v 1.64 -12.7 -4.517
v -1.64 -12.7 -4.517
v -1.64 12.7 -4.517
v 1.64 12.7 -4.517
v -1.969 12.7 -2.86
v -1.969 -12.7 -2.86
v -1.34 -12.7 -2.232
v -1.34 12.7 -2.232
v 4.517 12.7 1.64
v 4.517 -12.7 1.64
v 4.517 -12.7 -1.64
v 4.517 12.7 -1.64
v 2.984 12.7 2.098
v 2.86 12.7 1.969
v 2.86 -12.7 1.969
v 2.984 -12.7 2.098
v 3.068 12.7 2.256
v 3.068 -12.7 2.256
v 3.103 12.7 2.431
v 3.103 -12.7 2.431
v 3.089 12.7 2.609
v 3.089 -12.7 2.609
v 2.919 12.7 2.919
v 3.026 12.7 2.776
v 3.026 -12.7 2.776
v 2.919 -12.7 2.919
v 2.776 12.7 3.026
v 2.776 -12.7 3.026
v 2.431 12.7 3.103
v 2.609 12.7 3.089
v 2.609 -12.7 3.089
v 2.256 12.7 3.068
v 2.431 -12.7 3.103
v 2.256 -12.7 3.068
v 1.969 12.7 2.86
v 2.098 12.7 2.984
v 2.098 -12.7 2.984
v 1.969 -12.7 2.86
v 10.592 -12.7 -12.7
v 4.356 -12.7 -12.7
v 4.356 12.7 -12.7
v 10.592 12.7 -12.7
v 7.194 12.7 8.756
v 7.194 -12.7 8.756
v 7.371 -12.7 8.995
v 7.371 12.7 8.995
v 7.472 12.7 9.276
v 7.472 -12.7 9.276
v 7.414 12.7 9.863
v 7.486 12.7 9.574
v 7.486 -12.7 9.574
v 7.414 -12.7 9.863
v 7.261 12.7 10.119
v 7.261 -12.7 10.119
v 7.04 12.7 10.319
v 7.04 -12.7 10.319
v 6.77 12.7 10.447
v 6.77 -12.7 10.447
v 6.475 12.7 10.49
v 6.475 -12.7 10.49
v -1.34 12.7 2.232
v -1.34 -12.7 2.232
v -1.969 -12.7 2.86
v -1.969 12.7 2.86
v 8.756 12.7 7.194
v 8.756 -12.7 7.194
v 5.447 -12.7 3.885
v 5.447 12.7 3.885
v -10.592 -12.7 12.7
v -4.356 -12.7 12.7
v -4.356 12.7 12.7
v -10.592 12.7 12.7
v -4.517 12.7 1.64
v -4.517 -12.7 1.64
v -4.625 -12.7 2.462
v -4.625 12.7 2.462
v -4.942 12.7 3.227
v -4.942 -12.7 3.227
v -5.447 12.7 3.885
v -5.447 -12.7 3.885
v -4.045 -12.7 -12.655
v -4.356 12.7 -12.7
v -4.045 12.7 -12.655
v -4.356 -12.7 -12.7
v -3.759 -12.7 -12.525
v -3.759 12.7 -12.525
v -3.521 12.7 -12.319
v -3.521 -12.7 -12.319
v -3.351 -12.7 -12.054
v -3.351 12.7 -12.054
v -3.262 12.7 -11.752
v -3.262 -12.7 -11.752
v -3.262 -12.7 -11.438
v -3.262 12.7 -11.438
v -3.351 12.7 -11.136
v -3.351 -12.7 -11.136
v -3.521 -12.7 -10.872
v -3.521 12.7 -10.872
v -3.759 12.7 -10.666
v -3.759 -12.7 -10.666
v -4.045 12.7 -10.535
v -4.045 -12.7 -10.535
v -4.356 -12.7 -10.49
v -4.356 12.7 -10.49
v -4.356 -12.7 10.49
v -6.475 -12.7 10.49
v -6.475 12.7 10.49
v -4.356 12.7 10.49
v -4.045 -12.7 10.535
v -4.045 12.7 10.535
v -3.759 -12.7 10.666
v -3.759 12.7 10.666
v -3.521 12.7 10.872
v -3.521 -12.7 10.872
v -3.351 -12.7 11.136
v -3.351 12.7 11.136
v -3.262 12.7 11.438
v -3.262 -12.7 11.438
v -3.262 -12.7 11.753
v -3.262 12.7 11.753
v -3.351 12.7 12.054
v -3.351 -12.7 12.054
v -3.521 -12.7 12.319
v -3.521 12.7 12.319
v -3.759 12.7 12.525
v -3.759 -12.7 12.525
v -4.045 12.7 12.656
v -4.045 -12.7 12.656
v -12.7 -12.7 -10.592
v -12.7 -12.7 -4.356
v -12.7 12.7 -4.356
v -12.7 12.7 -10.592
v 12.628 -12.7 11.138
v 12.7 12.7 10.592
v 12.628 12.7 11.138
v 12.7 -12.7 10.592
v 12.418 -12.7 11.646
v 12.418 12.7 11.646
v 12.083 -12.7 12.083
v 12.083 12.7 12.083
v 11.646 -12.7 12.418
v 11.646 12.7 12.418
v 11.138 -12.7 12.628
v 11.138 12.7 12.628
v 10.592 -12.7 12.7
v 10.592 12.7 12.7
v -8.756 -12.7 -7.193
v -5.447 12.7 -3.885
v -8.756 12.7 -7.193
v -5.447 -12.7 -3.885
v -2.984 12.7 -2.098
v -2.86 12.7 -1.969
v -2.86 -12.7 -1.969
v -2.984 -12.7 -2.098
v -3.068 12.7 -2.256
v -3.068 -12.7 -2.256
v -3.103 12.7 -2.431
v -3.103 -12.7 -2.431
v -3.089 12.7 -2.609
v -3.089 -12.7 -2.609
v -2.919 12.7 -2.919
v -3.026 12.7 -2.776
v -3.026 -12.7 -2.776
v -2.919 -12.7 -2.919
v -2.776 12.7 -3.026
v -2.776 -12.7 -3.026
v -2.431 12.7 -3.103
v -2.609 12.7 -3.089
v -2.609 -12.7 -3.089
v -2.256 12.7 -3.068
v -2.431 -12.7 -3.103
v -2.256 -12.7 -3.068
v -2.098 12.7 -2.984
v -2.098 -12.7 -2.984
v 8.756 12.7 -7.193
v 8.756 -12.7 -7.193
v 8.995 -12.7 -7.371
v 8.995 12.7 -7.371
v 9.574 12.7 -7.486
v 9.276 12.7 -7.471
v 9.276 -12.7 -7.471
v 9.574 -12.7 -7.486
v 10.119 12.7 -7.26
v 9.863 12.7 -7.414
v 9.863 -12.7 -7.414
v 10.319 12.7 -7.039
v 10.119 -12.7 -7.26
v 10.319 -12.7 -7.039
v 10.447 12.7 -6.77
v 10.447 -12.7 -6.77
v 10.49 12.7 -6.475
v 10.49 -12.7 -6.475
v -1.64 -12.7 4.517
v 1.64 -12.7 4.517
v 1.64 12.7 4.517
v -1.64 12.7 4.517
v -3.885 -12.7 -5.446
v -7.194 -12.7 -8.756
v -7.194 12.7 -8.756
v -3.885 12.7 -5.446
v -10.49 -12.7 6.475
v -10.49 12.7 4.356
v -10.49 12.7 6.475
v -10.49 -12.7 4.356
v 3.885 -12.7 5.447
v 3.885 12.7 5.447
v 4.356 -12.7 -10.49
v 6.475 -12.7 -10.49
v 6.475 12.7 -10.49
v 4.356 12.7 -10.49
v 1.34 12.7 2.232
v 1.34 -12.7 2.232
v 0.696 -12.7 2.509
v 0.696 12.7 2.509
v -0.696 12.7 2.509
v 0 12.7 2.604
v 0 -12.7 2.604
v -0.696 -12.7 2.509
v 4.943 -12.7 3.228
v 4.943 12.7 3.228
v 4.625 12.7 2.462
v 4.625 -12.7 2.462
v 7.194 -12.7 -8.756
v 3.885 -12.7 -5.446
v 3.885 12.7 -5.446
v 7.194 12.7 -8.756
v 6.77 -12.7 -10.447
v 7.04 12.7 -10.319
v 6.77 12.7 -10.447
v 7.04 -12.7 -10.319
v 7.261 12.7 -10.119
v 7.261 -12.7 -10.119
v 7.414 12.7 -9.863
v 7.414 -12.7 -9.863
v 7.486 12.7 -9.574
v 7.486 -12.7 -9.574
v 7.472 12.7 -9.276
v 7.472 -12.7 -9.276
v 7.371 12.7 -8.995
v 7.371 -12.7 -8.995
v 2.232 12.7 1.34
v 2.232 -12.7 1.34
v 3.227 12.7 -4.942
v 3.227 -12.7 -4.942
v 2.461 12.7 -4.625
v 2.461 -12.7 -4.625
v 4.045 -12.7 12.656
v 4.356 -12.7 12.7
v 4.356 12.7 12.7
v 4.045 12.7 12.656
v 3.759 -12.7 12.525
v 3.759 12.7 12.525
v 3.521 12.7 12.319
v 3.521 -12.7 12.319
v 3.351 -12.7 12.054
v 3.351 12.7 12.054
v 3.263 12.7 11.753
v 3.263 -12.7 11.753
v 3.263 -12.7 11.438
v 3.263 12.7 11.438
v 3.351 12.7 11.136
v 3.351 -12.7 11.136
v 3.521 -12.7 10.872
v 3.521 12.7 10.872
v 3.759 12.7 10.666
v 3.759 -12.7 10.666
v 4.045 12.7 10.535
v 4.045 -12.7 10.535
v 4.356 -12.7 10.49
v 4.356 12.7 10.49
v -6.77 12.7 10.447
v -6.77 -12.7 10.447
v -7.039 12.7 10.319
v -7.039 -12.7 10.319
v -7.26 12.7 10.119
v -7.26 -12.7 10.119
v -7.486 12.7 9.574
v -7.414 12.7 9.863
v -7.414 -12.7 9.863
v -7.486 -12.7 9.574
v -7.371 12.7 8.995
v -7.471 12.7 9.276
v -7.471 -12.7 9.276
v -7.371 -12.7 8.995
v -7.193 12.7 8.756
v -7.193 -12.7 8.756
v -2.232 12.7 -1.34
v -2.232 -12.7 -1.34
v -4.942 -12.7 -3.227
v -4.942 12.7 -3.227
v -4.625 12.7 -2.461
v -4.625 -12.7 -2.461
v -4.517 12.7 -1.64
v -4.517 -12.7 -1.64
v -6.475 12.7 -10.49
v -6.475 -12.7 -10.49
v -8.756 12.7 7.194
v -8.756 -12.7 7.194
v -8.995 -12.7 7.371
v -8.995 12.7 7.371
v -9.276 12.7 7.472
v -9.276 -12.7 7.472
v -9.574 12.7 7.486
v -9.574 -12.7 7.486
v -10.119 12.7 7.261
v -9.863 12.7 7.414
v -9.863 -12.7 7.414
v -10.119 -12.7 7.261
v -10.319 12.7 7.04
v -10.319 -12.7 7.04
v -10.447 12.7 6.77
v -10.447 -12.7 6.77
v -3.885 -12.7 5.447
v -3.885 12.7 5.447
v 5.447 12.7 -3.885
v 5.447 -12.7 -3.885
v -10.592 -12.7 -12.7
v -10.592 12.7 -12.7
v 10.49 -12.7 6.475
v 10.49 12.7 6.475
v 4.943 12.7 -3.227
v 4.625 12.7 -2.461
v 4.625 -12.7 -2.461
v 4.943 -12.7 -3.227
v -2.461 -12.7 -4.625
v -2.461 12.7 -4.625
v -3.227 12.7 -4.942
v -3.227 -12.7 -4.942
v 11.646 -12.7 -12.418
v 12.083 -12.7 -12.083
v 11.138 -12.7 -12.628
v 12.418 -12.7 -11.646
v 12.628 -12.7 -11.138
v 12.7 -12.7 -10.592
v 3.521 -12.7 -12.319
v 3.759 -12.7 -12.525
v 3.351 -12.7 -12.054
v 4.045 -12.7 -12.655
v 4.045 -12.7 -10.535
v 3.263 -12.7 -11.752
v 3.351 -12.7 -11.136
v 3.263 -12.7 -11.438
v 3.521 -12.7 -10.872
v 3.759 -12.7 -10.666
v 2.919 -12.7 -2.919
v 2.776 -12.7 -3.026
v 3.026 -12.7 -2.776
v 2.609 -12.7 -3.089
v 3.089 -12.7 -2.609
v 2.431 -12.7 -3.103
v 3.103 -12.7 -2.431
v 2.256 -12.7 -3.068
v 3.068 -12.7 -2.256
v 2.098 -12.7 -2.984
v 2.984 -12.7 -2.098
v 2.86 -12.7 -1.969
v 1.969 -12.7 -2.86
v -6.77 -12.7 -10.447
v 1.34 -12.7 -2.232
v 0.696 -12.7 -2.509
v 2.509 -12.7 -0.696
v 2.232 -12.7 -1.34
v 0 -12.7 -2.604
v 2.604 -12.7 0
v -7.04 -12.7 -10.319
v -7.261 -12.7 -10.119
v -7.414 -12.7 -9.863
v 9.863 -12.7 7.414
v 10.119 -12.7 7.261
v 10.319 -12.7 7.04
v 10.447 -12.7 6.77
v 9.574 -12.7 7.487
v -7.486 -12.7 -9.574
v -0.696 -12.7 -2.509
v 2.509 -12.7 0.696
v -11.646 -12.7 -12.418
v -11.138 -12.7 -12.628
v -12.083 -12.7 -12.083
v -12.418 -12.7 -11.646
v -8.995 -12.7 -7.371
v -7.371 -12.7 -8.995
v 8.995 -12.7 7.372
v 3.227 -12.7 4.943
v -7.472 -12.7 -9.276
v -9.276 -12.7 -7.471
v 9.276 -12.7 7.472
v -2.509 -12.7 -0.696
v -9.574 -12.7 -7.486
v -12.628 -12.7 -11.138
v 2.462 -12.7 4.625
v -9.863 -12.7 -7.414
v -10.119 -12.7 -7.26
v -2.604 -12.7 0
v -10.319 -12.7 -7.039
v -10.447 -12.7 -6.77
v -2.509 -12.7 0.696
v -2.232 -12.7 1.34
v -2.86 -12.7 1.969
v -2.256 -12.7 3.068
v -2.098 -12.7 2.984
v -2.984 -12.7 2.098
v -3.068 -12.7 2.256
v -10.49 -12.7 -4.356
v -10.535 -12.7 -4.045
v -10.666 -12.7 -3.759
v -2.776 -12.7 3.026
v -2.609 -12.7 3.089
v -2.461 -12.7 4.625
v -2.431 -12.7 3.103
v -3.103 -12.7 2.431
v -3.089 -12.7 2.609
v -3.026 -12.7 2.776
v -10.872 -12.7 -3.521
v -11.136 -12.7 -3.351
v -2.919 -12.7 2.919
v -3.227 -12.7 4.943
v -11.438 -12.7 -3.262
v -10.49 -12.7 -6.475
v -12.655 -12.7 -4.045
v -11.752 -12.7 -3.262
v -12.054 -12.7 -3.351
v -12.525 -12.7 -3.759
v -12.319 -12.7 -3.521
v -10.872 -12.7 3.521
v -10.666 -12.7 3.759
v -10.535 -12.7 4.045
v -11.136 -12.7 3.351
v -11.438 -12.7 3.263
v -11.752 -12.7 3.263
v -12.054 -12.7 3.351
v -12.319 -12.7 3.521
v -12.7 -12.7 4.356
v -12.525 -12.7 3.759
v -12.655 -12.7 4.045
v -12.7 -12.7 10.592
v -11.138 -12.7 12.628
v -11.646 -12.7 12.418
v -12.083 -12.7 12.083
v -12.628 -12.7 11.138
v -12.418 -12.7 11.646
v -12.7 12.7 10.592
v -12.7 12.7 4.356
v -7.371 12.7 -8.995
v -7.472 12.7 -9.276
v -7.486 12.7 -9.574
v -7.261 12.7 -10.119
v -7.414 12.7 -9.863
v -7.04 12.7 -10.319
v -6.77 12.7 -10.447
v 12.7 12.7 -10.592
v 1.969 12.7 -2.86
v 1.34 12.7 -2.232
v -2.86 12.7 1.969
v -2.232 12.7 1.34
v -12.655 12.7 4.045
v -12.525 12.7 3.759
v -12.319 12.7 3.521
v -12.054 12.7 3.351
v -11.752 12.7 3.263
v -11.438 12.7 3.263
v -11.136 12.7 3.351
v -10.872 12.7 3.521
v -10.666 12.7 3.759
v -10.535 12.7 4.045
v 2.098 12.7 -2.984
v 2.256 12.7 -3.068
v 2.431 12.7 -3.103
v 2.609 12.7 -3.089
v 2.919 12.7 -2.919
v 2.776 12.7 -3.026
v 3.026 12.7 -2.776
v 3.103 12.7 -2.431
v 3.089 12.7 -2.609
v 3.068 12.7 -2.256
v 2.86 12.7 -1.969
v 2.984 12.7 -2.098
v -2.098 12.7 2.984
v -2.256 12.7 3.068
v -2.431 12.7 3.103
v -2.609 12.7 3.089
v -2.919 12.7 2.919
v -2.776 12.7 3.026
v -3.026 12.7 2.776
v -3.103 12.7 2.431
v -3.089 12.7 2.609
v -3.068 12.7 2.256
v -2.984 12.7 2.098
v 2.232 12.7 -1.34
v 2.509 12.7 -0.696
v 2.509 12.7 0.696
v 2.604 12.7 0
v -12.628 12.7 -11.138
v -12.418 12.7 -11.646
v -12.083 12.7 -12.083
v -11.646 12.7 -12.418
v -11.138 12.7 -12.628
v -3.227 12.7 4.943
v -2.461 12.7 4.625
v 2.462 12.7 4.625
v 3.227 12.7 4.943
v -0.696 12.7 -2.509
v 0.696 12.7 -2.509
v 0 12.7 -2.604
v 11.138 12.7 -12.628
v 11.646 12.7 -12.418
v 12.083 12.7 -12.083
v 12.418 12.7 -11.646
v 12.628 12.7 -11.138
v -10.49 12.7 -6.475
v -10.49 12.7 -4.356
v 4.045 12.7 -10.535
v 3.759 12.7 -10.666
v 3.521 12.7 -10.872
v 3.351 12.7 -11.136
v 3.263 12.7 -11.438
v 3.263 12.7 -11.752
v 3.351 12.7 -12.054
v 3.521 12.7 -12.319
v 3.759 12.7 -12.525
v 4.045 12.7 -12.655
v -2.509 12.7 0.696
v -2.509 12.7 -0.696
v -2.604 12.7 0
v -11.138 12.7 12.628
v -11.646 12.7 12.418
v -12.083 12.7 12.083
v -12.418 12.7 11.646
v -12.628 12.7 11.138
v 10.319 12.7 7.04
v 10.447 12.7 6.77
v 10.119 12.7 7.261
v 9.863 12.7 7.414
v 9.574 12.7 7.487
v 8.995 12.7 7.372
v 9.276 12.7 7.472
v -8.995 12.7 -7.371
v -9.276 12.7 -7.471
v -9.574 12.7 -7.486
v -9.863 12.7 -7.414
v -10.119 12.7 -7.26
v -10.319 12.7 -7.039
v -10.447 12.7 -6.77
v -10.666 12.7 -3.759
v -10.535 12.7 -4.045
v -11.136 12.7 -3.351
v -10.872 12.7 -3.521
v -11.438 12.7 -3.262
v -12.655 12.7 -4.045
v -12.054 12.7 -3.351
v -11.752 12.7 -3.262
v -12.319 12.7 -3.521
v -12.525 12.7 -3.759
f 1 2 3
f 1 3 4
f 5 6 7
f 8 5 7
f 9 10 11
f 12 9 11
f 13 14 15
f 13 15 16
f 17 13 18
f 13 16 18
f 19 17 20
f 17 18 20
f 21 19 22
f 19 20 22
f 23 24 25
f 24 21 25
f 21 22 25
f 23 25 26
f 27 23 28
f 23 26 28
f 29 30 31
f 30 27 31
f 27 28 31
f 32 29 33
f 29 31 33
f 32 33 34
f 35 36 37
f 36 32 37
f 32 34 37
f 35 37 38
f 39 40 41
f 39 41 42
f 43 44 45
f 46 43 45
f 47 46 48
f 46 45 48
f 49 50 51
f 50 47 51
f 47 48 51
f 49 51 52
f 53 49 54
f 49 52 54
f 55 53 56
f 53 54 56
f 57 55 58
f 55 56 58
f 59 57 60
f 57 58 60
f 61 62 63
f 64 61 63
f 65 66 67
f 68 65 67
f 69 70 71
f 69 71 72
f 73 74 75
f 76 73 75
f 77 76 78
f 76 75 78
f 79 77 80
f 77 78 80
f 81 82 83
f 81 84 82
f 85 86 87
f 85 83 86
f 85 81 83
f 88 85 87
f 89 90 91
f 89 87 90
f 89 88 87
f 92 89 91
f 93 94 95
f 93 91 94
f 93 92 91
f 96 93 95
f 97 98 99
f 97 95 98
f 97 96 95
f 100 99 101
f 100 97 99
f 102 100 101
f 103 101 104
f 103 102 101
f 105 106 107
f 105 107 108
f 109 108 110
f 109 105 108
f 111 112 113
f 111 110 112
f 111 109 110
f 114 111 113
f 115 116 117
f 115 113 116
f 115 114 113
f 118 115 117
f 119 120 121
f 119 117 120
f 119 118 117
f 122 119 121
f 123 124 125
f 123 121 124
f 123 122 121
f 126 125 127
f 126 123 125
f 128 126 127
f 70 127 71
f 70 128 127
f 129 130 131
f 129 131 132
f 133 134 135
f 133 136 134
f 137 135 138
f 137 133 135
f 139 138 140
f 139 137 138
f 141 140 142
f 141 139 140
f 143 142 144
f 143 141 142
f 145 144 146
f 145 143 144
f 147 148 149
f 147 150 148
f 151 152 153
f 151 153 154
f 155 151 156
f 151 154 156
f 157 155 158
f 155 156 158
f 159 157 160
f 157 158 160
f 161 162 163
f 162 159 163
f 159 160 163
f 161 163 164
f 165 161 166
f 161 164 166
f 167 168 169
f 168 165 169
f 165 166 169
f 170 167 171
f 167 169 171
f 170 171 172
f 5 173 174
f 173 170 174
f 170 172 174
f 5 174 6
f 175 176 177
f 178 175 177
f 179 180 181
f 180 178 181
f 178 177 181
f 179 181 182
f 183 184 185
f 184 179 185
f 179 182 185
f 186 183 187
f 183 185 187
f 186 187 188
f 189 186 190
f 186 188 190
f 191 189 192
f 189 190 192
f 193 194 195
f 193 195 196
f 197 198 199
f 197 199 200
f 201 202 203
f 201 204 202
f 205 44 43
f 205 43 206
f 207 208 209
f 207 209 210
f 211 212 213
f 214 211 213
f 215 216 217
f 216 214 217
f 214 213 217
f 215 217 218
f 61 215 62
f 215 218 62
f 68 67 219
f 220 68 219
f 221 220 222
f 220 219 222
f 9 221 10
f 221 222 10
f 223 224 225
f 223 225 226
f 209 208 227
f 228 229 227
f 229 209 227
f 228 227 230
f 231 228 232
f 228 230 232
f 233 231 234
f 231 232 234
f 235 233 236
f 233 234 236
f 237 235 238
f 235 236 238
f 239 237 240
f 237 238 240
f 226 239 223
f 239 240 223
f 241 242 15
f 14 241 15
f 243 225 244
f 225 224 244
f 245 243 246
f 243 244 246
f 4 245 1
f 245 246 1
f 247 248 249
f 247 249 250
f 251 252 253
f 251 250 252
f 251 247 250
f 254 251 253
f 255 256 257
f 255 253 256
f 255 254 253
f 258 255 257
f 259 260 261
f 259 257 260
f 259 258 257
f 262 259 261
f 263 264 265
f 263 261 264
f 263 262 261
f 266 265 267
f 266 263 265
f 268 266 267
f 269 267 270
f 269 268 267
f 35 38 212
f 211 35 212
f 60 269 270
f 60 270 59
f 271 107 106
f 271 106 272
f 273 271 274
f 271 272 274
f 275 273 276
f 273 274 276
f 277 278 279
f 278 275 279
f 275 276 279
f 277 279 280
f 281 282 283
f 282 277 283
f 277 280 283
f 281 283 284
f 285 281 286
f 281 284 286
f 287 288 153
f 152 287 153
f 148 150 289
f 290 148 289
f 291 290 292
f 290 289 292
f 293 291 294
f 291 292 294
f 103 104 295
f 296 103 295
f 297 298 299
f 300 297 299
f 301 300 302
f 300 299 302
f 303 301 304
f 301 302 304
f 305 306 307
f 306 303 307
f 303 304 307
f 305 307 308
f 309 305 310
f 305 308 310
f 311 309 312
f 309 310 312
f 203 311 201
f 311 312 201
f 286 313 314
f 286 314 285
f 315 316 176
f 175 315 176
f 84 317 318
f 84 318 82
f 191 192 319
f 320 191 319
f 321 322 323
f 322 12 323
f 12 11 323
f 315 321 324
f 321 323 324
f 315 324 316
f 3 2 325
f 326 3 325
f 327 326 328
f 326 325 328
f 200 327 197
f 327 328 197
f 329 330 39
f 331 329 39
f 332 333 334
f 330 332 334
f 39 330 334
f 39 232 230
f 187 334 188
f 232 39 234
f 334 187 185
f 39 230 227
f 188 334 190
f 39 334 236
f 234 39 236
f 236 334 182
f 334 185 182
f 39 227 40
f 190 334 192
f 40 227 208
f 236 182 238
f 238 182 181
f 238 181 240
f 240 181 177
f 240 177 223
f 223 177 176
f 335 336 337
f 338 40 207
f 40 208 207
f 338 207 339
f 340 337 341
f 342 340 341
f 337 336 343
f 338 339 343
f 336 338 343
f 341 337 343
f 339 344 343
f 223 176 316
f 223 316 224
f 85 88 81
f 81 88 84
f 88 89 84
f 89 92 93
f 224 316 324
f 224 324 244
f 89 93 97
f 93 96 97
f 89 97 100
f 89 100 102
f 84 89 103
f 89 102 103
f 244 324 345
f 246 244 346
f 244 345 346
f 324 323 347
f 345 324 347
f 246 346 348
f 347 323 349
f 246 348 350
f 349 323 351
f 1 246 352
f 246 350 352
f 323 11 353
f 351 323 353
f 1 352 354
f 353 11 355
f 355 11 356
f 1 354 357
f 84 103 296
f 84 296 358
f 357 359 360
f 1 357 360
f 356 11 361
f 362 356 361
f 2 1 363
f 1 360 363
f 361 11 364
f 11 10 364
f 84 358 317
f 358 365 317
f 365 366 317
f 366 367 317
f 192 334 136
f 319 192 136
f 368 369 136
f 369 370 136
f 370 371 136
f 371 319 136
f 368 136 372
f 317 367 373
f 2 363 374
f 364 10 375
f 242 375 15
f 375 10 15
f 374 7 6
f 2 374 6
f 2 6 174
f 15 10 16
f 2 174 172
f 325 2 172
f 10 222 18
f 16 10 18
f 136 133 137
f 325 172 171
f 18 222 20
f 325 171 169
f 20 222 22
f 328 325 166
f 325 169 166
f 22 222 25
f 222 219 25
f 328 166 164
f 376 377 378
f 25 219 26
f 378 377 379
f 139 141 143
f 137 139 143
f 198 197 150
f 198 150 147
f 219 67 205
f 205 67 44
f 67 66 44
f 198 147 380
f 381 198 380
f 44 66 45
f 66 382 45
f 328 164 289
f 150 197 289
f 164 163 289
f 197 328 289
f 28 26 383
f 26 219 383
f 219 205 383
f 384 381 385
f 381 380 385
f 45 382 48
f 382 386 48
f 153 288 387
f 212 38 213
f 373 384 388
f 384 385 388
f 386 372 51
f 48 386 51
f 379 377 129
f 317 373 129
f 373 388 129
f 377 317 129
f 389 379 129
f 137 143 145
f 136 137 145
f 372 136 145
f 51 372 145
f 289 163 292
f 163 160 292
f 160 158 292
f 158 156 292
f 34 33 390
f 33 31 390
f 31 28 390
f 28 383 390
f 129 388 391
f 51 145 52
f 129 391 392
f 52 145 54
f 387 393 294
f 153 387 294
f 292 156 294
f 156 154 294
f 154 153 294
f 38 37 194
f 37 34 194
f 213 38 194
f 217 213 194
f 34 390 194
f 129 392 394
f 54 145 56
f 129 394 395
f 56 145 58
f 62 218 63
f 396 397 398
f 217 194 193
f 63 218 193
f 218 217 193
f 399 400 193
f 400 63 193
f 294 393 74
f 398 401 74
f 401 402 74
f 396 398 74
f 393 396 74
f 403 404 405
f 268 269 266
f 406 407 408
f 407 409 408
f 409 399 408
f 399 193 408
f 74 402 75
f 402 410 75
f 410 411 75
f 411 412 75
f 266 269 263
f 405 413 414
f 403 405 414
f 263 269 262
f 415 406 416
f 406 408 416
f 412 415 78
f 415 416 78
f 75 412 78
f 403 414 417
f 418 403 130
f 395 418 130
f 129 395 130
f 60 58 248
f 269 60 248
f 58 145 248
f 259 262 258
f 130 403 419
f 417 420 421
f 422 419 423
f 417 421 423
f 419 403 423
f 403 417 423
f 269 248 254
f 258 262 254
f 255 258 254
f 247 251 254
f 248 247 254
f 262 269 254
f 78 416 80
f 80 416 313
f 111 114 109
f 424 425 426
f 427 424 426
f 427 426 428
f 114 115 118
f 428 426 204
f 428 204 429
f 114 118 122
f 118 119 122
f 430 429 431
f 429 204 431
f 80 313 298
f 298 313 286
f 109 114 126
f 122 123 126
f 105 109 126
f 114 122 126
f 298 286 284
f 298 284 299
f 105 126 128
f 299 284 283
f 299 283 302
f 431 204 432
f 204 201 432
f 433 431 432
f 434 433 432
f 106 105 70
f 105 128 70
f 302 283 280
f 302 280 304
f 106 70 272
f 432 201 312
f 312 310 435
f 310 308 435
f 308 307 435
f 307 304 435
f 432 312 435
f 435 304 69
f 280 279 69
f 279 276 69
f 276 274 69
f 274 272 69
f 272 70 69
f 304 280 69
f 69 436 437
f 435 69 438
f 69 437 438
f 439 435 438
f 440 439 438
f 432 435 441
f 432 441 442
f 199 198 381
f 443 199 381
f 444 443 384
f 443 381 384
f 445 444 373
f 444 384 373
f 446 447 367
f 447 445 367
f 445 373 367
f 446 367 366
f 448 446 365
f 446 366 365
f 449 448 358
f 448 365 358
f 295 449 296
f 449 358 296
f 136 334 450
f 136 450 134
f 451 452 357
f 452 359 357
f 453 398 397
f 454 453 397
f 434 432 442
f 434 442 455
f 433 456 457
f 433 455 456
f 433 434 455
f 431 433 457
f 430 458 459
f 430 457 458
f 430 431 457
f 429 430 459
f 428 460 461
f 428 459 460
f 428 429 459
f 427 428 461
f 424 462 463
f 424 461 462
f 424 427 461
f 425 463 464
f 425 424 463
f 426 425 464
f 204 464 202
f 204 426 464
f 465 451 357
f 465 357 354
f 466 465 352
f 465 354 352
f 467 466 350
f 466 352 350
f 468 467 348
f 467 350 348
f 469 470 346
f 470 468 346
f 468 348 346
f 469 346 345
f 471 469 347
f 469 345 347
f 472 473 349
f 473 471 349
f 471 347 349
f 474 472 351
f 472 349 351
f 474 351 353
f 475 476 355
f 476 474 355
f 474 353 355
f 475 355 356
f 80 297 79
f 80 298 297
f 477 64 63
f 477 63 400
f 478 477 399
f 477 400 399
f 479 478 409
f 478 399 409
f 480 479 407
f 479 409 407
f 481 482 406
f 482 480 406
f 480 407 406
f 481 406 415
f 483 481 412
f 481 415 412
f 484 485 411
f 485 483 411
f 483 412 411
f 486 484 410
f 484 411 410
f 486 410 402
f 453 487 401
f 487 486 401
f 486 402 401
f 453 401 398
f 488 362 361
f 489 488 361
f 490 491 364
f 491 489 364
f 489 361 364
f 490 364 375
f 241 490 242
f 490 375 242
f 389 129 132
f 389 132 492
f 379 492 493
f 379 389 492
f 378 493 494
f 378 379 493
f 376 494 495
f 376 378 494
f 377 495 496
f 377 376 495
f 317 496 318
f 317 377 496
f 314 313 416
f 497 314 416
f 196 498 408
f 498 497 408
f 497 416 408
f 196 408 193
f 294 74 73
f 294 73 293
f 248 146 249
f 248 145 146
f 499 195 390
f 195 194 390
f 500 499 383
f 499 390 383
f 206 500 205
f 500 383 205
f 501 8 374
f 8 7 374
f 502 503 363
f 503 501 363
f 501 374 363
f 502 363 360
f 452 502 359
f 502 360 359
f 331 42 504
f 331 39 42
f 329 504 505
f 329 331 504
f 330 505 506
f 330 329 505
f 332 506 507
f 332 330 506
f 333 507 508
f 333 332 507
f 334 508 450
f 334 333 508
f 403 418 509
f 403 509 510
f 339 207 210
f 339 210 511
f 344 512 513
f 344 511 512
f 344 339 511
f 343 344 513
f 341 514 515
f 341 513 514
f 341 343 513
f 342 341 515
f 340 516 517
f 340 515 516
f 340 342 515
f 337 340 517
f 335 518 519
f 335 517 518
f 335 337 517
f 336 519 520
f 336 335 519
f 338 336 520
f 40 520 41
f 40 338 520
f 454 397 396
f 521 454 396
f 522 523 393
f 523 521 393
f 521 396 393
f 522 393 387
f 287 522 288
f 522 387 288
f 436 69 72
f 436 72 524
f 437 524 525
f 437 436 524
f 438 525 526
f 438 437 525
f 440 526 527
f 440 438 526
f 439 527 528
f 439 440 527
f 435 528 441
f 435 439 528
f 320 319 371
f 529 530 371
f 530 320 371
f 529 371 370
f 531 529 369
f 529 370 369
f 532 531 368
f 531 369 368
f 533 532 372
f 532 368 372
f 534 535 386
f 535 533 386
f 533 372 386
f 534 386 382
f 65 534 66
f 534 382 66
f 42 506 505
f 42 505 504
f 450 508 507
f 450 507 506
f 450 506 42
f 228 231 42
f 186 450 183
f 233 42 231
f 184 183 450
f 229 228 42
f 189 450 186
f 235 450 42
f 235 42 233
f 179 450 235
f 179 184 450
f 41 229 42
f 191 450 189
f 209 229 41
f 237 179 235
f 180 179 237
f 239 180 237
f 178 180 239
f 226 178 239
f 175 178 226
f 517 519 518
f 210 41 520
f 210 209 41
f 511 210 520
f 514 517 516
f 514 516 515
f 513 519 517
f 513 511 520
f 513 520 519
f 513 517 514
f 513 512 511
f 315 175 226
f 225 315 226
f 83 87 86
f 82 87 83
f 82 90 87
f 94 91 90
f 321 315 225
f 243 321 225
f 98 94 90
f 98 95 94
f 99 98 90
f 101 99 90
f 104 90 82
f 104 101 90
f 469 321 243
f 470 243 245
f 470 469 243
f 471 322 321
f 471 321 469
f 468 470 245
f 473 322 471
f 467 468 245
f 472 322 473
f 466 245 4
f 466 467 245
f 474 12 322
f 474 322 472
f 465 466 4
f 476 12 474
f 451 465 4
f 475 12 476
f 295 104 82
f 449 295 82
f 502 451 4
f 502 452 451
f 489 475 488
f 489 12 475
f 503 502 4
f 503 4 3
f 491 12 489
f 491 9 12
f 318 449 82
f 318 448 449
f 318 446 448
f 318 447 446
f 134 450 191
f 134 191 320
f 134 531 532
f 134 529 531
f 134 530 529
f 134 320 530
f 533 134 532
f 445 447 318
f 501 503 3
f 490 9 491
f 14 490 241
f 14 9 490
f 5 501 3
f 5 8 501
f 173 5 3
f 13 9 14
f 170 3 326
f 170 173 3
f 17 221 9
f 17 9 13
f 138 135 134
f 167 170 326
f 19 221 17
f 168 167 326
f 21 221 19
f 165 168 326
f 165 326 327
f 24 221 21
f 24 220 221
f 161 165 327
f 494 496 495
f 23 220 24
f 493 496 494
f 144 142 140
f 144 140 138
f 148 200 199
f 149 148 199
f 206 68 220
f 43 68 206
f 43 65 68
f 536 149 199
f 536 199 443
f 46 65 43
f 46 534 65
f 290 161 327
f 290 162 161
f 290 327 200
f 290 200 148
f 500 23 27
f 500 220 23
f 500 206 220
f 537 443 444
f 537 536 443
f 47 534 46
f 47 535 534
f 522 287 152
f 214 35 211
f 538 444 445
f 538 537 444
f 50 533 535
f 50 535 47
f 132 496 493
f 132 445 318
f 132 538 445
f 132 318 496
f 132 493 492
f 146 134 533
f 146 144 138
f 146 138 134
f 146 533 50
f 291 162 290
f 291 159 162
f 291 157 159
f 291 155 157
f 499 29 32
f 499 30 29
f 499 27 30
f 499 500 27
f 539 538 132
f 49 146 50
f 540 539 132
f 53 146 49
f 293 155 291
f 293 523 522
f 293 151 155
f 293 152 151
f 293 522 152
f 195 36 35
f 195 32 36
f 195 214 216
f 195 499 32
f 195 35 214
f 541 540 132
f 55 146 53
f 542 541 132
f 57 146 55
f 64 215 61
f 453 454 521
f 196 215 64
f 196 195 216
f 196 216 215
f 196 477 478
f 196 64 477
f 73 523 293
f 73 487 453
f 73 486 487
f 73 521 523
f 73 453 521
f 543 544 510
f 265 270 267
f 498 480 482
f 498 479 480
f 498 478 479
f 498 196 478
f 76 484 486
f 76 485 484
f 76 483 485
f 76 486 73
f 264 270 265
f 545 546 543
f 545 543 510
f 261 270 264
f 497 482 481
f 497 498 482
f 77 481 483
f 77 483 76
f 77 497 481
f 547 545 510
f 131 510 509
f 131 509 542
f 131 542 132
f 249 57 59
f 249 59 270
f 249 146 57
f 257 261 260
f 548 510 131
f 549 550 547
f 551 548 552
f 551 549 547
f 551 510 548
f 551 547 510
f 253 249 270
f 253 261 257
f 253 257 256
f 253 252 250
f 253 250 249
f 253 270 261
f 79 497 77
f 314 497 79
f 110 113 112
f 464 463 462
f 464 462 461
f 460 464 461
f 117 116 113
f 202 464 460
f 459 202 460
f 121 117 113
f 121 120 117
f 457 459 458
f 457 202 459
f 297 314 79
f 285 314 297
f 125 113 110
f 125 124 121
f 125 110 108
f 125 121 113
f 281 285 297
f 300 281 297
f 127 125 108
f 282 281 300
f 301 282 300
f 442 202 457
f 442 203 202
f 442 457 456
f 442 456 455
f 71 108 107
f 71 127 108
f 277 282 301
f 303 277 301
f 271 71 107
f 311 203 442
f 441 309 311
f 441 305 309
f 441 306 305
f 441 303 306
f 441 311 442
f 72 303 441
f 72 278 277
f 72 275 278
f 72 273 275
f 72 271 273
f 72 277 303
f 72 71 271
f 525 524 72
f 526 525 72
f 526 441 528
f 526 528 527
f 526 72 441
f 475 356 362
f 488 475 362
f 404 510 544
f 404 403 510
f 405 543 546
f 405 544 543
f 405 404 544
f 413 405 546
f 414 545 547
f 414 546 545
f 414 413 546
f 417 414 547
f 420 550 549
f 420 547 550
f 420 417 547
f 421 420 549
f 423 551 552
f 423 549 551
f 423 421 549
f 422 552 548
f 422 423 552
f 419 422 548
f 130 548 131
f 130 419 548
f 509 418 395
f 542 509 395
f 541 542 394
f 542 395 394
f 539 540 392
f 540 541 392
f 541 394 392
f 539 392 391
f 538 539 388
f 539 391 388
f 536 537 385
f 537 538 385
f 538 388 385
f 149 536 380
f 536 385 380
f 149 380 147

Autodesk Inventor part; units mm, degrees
ref_plane "YZ Plane" through (0, 0, 0) normal (1, 0, 0) x (0, 1, 0)
ref_plane "XZ Plane" through (0, 0, 0) normal (0, 1, 0) x (-1, 0, 0)
ref_plane "XY Plane" through (0, 0, 0) normal (0, 0, 1) x (1, 0, 0)
sketch "Sketch1" plane through (0, 0, 0) normal (0, 1, 0) x (-1, 0, 0)
  arc A0 (2.8605, 1.9692) -> (1.9692, 2.8605) centre (2.4696, 2.4696) ccw
  line L0 (1.3405, 2.2319) -> (1.9692, 2.8605)
  arc A1 (1.3405, 2.2319) -> (-1.3405, 2.2319) centre (0, 0) ccw
  line L1 (-1.9692, 2.8605) -> (-1.3405, 2.2319)
  arc A2 (-1.9692, 2.8605) -> (-2.8605, 1.9692) centre (-2.4696, 2.4696) ccw
  line L2 (-2.2319, 1.3405) -> (-2.8605, 1.9692)
  arc A3 (-2.2319, 1.3405) -> (-2.2319, -1.3405) centre (0, 0) ccw
  line L3 (-2.8605, -1.9692) -> (-2.2319, -1.3405)
  arc A4 (-2.8605, -1.9692) -> (-1.9692, -2.8605) centre (-2.4696, -2.4696) ccw
  line L4 (-1.3405, -2.2319) -> (-1.9692, -2.8605)
  arc A5 (-1.3405, -2.2319) -> (1.3405, -2.2319) centre (0, 0) ccw
  line L5 (1.9692, -2.8605) -> (1.3405, -2.2319)
  arc A6 (1.9692, -2.8605) -> (2.8605, -1.9692) centre (2.4696, -2.4696) ccw
  line L6 (2.2319, -1.3405) -> (2.8605, -1.9692)
  arc A7 (2.2319, -1.3405) -> (2.2319, 1.3405) centre (0, 0) ccw
  line L7 (2.8605, 1.9692) -> (2.2319, 1.3405)
  arc A8 (-4.5172, 1.6401) -> (-5.4471, 3.8852) centre (-7.6922, 1.6401) ccw
  line L8 (-8.7558, 7.1939) -> (-5.4471, 3.8852)
  arc A9 (-8.7558, 7.1939) -> (-10.4905, 6.4753) centre (-9.4743, 6.4753) ccw
  line L9 (-10.4905, -6.4748) -> (-10.4905, 6.4753)
  arc A10 (-10.4905, -6.4748) -> (-8.7558, -7.1933) centre (-9.4743, -6.4748) ccw
  line L10 (-5.4471, -3.8846) -> (-8.7558, -7.1933)
  arc A11 (-5.4471, -3.8846) -> (-4.5172, -1.6396) centre (-7.6922, -1.6396) ccw
  line L11 (-4.5172, 1.6401) -> (-4.5172, -1.6396)
  arc A12 (1.6396, 4.5172) -> (3.8846, 5.4471) centre (1.6396, 7.6922) ccw
  line L12 (3.8846, 5.4471) -> (7.1933, 8.7558)
  arc A13 (7.1933, 8.7558) -> (6.4748, 10.4905) centre (6.4748, 9.4743) ccw
  line L13 (6.4748, 10.4905) -> (4.356, 10.4905)
  arc A14 (4.356, 12.7003) -> (4.356, 10.4905) centre (4.356, 11.5954) ccw
  line L14 (4.356, 12.7003) -> (10.5919, 12.7003)
  arc A15 (12.7001, 10.5921) -> (10.5919, 12.7003) centre (10.5919, 10.5921) ccw
  line L15 (12.7001, 10.5921) -> (12.7001, 4.3562)
  arc A16 (10.4903, 4.3562) -> (12.7001, 4.3562) centre (11.5952, 4.3562) ccw
  line L16 (10.4903, 4.3562) -> (10.4903, 6.475)
  arc A17 (10.4903, 6.475) -> (8.7555, 7.1936) centre (9.4741, 6.475) ccw
  line L17 (8.7555, 7.1936) -> (5.4468, 3.8849)
  arc A18 (5.4468, 3.8849) -> (4.5169, 1.6399) centre (7.6919, 1.6399) ccw
  line L18 (4.5169, 1.6399) -> (4.5169, -1.6396)
  arc A19 (4.5169, -1.6396) -> (5.4468, -3.8846) centre (7.6919, -1.6396) ccw
  line L19 (5.4468, -3.8846) -> (8.7555, -7.1933)
  arc A20 (8.7555, -7.1933) -> (10.4903, -6.4748) centre (9.4741, -6.4748) ccw
  line L20 (10.4903, -6.4748) -> (10.4903, -4.356)
  arc A21 (12.7001, -4.356) -> (10.4903, -4.356) centre (11.5952, -4.356) ccw
  line L21 (12.7001, -4.356) -> (12.7001, -10.5919)
  arc A22 (10.5919, -12.7001) -> (12.7001, -10.5919) centre (10.5919, -10.5919) ccw
  line L22 (10.5919, -12.7001) -> (4.356, -12.7001)
  arc A23 (4.356, -10.4903) -> (4.356, -12.7001) centre (4.356, -11.5952) ccw
  line L23 (4.356, -10.4903) -> (6.475, -10.4903)
  arc A24 (6.475, -10.4903) -> (7.1936, -8.7555) centre (6.475, -9.4741) ccw
  line L24 (7.1936, -8.7555) -> (3.8846, -5.4465)
  arc A25 (3.8846, -5.4465) -> (1.6396, -4.5166) centre (1.6396, -7.6916) ccw
  line L25 (1.6396, -4.5166) -> (-1.6396, -4.5166)
  arc A26 (-1.6396, -4.5166) -> (-3.8846, -5.4465) centre (-1.6396, -7.6916) ccw
  line L26 (-3.8846, -5.4465) -> (-7.1936, -8.7555)
  arc A27 (-7.1936, -8.7555) -> (-6.475, -10.4903) centre (-6.475, -9.4741) ccw
  line L27 (-6.475, -10.4903) -> (-4.3562, -10.4903)
  arc A28 (-4.3562, -12.7001) -> (-4.3562, -10.4903) centre (-4.3562, -11.5952) ccw
  line L28 (-4.3562, -12.7001) -> (-10.5919, -12.7001)
  arc A29 (-12.7001, -10.5919) -> (-10.5919, -12.7001) centre (-10.5919, -10.5919) ccw
  line L29 (-12.7001, -10.5919) -> (-12.7001, 10.5921)
  arc A30 (-10.5919, 12.7003) -> (-12.7001, 10.5921) centre (-10.5919, 10.5921) ccw
  line L30 (-10.5919, 12.7003) -> (-4.3562, 12.7003)
  arc A31 (-4.3562, 10.4905) -> (-4.3562, 12.7003) centre (-4.3562, 11.5954) ccw
  line L31 (-4.3562, 10.4905) -> (-6.475, 10.4905)
  arc A32 (-6.475, 10.4905) -> (-7.1936, 8.7558) centre (-6.475, 9.4743) ccw
  line L32 (-7.1936, 8.7558) -> (-3.8849, 5.4471)
  arc A33 (-3.8849, 5.4471) -> (-1.6399, 4.5172) centre (-1.6399, 7.6922) ccw
  line L33 (-1.6399, 4.5172) -> (1.6396, 4.5172)
  point P0 (0, 0)
  dimension "d36" = 8.1835
  dimension "d81" = 1.0162
  dimension "d82" = 3.175
  dimension "d95" = 8.1832
  dimension "d96" = 17.2172
  dimension "d97" = 23.1906
  dimension "d98" = 25.4002
  dimension "d100" = 8.1832
  dimension "d101" = 2.2092
  dimension "d104" = 2.2091
  dimension "d131" = 1.1049
  dimension "d132" = 2.1082
  dimension "d133" = 0.635
  dimension "d134" = 2.6035
  dimension "d135" = 2.6035
  dimension "d136" = 2.6035
  dimension "d137" = 2.6035
  dimension "d138" = 45
  dimension "d139" = 45
  dimension "d140" = 45
  dimension "d141" = 45
  dimension "d142" = 45
  dimension "d143" = 25.4004
  dimension "d144" = 0.4742
  dimension "d145" = 1.7347
  dimension "d146" = 0.4744
  dimension "d147" = 1.7349
  dimension "d148" = 12.7001
  dimension "d149" = 12.7003
  dimension "d150" = 1.1046
  dimension "d151" = 1.1048
  dimension "d152" = 0.6303
  dimension "d153" = 0.6303
  dimension "d154" = 0.6303
  dimension "d155" = 0.6303
  dimension "d156" = 8.3441
  dimension "d157" = 17.0563
  dimension "d158" = 8.3441
  dimension "d159" = 8.3441
  dimension "d160" = 9.8396
  dimension "d161" = 9.8396
  dimension "d162" = 10.2305
  dimension "d163" = 10.2305
  dimension "d164" = 10.4682
  dimension "d165" = 10.4682
  dimension "d166" = 14.6692
  dimension "d167" = 14.6692
  dimension "d168" = 15.1696
  dimension "d169" = 15.1696
  dimension "d170" = 17.0563
  dimension "d171" = 17.0563
extrude "Extrusion1" add sketch "Sketch1" along normal mid plane 25.4
properties part number "1003-S-BLACK-FB" material "6105-T5"
